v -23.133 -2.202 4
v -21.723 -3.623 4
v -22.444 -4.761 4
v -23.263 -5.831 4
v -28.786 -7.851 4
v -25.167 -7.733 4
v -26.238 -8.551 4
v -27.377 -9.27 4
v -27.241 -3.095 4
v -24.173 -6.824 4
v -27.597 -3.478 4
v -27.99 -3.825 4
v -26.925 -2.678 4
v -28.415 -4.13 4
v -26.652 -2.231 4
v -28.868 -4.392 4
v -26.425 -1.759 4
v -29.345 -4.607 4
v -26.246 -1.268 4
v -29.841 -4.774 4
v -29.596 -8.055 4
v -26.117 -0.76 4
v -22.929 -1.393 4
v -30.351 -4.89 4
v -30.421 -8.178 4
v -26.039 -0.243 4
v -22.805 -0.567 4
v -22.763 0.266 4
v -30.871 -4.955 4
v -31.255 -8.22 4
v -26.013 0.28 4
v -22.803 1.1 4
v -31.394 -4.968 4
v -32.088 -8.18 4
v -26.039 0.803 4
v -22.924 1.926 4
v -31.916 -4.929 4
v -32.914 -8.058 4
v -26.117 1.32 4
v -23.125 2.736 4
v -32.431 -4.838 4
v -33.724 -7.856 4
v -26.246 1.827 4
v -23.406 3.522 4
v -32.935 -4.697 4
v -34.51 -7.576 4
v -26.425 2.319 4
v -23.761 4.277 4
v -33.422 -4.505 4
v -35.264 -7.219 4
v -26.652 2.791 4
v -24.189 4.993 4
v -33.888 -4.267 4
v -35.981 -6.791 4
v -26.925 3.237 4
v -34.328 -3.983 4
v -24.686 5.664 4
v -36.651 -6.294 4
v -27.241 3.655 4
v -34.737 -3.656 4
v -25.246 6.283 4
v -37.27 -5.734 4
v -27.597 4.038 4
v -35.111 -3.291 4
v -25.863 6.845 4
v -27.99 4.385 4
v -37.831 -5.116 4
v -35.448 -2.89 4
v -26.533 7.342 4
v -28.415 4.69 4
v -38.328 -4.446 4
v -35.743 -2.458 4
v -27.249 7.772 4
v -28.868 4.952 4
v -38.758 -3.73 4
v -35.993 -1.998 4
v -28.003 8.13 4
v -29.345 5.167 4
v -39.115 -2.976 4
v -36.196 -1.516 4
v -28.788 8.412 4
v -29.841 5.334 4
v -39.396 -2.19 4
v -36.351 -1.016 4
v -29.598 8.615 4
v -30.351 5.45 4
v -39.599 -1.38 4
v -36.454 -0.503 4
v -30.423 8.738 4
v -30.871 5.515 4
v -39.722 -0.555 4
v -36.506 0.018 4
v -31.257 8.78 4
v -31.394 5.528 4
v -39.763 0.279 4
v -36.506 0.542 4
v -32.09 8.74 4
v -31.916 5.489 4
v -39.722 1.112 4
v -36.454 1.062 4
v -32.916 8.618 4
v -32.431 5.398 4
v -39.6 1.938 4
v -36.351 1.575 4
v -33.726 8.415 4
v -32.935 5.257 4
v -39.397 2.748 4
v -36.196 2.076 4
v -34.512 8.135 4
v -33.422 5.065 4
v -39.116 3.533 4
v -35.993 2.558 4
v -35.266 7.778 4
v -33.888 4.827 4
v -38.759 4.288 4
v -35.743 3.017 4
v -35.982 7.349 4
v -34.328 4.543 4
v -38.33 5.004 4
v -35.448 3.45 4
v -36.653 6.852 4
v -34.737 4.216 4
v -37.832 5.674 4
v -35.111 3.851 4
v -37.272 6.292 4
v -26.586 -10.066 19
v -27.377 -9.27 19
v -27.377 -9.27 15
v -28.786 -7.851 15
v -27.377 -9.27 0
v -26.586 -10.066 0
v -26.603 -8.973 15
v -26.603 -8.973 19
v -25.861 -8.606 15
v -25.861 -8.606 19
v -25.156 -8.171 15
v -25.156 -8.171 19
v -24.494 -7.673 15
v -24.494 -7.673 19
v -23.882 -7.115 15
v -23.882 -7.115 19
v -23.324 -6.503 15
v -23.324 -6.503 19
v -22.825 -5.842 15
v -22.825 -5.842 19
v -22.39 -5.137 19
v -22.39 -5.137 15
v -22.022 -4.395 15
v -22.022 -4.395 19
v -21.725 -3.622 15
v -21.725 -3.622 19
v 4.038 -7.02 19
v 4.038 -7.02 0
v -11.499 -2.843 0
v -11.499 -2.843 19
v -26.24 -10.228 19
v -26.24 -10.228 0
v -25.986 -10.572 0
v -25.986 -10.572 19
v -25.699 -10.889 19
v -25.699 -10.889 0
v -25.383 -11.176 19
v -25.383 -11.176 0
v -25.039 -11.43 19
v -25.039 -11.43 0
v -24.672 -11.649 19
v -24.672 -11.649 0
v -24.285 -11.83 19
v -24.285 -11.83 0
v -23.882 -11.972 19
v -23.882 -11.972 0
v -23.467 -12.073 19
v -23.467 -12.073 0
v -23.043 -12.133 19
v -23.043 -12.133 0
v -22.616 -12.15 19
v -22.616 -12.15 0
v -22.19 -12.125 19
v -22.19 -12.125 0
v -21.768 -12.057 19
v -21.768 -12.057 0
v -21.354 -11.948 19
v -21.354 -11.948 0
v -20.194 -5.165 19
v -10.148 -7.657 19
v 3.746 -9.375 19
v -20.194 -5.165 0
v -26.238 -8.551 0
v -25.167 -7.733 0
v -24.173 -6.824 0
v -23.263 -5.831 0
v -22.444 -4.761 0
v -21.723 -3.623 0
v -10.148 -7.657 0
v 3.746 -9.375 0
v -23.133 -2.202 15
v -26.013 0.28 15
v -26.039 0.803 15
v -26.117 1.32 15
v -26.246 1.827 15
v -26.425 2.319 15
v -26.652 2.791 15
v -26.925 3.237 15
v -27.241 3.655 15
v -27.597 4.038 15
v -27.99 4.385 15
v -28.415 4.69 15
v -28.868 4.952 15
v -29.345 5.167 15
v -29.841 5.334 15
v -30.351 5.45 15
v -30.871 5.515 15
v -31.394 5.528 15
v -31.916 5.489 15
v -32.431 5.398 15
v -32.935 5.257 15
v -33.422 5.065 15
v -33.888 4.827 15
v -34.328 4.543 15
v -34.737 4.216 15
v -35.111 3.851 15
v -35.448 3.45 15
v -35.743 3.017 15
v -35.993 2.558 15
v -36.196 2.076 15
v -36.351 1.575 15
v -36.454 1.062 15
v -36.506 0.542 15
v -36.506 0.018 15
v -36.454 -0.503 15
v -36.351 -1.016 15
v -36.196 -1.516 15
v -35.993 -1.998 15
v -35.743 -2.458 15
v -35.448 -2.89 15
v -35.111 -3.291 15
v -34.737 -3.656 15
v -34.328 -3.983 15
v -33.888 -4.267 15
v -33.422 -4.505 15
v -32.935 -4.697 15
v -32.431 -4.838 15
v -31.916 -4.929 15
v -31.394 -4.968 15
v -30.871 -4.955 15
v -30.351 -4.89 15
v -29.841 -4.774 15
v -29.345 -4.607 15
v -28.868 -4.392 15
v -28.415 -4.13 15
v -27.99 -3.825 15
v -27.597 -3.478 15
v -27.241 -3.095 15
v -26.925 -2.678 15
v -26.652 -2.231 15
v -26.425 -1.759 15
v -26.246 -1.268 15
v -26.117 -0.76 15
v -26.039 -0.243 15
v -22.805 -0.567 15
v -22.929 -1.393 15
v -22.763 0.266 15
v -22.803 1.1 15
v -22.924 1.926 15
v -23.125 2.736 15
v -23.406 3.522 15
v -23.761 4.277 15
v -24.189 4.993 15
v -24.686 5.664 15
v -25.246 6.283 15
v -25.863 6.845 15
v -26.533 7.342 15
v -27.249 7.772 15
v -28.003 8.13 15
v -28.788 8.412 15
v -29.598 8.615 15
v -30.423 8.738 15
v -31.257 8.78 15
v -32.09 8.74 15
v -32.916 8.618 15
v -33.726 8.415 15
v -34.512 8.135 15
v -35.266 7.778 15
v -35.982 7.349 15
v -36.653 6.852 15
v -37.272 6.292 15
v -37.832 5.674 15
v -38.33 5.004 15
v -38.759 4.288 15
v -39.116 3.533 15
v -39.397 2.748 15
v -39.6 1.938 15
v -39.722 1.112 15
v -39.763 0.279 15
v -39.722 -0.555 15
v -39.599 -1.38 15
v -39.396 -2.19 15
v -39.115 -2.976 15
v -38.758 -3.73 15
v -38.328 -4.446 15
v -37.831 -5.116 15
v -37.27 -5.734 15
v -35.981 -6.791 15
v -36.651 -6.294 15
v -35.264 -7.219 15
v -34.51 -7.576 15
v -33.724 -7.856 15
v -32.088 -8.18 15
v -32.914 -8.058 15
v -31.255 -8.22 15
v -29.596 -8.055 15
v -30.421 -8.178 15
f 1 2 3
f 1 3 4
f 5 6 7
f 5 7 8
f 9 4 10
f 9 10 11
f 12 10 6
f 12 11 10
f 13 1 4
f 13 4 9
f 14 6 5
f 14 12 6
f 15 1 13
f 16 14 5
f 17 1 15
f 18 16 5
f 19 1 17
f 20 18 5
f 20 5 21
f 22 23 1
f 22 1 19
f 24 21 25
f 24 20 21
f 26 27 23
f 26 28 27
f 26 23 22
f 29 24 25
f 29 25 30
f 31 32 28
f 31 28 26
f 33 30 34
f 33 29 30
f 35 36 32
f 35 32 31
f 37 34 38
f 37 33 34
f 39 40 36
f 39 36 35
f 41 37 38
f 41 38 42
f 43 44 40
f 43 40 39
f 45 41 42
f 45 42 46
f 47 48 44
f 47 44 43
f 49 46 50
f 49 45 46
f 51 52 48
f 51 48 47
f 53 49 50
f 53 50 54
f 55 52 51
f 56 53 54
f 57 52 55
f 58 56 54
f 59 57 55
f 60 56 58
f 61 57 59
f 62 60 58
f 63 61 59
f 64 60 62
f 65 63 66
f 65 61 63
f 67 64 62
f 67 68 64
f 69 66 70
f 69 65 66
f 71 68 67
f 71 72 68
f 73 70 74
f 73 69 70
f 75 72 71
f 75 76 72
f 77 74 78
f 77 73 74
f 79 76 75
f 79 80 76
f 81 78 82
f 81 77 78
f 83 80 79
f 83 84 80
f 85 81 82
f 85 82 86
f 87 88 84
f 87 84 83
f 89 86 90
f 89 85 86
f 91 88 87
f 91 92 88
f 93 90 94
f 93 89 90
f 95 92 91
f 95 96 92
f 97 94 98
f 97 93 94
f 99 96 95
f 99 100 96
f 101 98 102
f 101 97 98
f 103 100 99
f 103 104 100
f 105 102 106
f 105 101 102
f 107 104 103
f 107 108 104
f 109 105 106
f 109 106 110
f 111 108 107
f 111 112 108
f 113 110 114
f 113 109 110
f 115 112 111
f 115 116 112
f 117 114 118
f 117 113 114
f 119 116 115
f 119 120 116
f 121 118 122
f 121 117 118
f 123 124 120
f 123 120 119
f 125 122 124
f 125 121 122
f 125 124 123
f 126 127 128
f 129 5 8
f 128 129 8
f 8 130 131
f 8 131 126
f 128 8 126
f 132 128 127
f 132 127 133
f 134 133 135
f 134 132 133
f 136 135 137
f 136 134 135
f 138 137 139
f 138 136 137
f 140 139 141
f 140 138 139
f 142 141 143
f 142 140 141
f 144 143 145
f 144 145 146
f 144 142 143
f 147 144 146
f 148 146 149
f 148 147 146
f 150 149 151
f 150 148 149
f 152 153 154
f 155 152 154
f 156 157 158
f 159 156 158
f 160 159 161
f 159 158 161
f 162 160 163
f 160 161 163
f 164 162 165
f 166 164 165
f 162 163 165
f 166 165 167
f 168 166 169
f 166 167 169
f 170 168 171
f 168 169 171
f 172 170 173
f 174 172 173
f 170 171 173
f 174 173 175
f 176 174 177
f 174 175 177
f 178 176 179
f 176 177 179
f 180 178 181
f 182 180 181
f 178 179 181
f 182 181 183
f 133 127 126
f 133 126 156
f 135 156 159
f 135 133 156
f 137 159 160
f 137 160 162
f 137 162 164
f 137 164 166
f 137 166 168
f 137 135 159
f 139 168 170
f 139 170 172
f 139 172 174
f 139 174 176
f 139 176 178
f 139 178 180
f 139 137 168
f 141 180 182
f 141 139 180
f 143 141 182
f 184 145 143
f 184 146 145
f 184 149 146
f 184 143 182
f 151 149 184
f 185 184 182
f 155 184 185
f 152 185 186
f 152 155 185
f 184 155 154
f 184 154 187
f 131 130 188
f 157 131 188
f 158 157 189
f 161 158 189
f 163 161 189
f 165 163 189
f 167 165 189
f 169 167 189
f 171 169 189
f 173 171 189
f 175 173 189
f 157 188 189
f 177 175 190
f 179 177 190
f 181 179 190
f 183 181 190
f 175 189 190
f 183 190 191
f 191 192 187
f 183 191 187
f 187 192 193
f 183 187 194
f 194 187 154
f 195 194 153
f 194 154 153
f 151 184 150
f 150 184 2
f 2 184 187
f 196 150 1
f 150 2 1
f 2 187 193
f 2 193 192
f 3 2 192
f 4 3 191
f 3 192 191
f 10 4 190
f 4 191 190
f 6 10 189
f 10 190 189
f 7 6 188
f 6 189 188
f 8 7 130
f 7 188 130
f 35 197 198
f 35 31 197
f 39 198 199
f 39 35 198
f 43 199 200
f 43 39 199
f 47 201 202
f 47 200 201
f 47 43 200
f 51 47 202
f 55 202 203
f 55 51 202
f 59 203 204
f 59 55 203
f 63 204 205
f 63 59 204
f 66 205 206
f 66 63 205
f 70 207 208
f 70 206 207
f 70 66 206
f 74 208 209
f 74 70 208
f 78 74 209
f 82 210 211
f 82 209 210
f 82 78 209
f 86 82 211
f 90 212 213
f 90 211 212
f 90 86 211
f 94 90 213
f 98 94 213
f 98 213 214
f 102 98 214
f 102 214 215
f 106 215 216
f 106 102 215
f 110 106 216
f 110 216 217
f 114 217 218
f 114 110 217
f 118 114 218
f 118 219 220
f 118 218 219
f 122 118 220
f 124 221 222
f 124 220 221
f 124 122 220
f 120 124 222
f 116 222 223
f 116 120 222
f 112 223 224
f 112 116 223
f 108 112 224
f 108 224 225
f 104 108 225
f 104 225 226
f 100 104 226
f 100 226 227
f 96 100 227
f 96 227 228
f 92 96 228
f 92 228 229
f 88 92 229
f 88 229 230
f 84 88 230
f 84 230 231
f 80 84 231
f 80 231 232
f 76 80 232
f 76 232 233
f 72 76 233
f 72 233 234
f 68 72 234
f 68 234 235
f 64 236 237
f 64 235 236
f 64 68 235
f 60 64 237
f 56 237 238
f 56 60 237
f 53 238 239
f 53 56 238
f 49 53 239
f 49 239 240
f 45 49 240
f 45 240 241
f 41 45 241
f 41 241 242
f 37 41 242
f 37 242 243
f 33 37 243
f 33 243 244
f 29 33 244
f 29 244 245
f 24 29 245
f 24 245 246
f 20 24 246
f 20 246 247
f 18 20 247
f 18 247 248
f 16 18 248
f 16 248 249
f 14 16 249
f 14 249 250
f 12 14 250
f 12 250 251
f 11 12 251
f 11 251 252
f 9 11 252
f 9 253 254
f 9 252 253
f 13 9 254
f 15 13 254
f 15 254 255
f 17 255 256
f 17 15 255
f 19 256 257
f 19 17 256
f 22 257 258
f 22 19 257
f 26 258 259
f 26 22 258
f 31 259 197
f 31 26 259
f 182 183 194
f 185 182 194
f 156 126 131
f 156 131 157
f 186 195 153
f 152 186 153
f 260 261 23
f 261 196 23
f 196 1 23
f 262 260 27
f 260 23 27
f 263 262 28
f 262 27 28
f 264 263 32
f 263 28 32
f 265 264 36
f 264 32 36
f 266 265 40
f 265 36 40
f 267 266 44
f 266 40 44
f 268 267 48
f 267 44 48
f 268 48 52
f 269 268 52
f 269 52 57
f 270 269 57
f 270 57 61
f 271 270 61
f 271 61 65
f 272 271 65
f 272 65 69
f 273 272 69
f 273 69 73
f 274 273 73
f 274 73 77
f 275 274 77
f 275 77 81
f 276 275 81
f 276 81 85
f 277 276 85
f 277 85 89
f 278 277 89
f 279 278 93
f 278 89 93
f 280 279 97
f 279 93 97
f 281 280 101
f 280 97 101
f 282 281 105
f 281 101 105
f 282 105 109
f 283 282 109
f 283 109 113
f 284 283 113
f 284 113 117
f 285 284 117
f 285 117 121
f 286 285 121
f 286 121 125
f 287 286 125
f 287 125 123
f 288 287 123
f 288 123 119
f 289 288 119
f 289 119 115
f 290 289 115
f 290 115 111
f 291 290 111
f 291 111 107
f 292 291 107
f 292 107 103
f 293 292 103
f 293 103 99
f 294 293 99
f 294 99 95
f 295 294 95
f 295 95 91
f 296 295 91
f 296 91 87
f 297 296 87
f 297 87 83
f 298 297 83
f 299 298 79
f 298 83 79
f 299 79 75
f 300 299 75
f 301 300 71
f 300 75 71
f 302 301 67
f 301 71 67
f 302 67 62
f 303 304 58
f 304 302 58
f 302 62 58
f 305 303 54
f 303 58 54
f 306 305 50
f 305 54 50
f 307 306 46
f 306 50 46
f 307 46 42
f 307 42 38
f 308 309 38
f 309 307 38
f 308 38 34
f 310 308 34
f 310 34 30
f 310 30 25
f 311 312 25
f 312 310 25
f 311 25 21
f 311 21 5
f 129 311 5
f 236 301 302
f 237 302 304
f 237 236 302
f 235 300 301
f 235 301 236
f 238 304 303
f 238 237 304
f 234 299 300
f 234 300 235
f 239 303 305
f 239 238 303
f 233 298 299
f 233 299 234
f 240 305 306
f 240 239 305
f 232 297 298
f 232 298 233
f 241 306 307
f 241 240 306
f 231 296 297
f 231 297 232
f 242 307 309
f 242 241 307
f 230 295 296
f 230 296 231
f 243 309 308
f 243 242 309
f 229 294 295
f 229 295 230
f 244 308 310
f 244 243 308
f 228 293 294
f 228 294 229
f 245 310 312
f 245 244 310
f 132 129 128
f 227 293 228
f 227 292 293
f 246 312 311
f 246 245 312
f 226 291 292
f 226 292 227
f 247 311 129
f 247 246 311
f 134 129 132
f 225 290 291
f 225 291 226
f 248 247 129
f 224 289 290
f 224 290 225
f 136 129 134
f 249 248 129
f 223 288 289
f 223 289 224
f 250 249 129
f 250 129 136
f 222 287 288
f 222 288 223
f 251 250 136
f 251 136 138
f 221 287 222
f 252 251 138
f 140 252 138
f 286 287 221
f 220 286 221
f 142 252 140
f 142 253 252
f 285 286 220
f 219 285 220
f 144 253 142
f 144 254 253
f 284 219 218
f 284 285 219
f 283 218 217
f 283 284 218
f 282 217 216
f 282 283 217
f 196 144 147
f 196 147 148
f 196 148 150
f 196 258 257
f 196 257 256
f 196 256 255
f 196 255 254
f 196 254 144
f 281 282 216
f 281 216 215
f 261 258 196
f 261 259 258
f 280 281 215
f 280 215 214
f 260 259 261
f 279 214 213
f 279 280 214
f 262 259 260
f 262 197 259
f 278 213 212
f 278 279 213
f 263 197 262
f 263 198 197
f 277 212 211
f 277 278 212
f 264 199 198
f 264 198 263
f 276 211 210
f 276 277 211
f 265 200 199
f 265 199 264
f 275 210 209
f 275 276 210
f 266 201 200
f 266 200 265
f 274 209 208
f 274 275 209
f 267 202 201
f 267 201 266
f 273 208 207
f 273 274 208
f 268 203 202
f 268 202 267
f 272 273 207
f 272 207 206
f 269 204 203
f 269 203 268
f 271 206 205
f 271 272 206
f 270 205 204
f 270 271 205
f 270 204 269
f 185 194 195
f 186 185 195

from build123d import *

# Parameters (mm, degrees)
BOSS_EXTRUDE1_OUTLINE_R = 5.250010824
BOSS_EXTRUDE1_DEPTH     = 19
CUT_EXTRUDE1_START      = -4
SKETCH2_R               = 8.500003527
CUT_EXTRUDE1_DEPTH      = 4
SKETCH3_R               = 8.500003527
CUT_EXTRUDE2_DEPTH      = 4
CUT_EXTRUDE3_START      = -4
CUT_EXTRUDE3_DEPTH      = 4
CUT_EXTRUDE4_DEPTH      = 4


# Read off the part's stored shape, not the designer's step: Boss-Extrude1
with BuildPart() as part:
    # Boss-Extrude1 outline → Boss-Extrude1 (new body)
    with BuildSketch(Plane.XY):
        with BuildLine():
            ThreePointArc((-23.133312794, -2.201771211), (-37.271533994, 6.292181292), (-28.786231545, -7.851233083))
            Line((-28.786231545, -7.851233083), (-26.586143602, -10.066323126))
            Line((-26.586143602, -10.066323126), (-26.23976909, -10.228203619))
            ThreePointArc((-26.23976909, -10.228203619), (-24.085157131, -11.906333766), (-21.354454149, -11.947983588))
            Line((-21.354454149, -11.947983588), (-10.14791118, -7.656975592))
            Line((-10.14791118, -7.656975592), (3.746314894, -9.374802435))
            Line((3.746314894, -9.374802435), (4.037513624, -7.019745673))
            Line((4.037513624, -7.019745673), (-11.498619188, -2.842881049))
            Line((-11.498619188, -2.842881049), (-20.193931688, -5.164955939))
            Line((-20.193931688, -5.164955939), (-23.133312794, -2.201771211))
        make_face()
        with Locations((-31.26296245, 0.27993313)):
            Circle(BOSS_EXTRUDE1_OUTLINE_R, mode=Mode.SUBTRACT)
    extrude(amount=BOSS_EXTRUDE1_DEPTH)

    # Sketch2 → Cut-Extrude1 (cut)
    with BuildSketch(Plane.XY.offset(19).offset(CUT_EXTRUDE1_START)):
        with Locations((-31.26296245, 0.27993313)):
            Circle(SKETCH2_R)
    extrude(amount=CUT_EXTRUDE1_DEPTH, mode=Mode.SUBTRACT)

    # Sketch3 → Cut-Extrude2 (cut)
    with BuildSketch(Plane(origin=(0, 0, 0), x_dir=(-1, 0, 0), z_dir=(0, 0, -1))):
        with Locations((31.26296245, 0.27993313)):
            Circle(SKETCH3_R)
    extrude(amount=-CUT_EXTRUDE2_DEPTH, mode=Mode.SUBTRACT)

    # Sketch4 → Cut-Extrude3 (cut)
    with BuildSketch(Plane.XY.offset(19).offset(CUT_EXTRUDE3_START)):
        with BuildLine():
            Line((-28.786231545, -7.851233083), (-27.3768314, -9.270243736))
            ThreePointArc((-27.3768314, -9.270243736), (-23.881833101, -7.115358231), (-21.724813867, -3.621676409))
            Line((-21.724813867, -3.621676409), (-23.133312794, -2.201771211))
            ThreePointArc((-23.133312794, -2.201771211), (-25.254390905, -5.732315031), (-28.786231545, -7.851233083))
        make_face()
    extrude(amount=CUT_EXTRUDE3_DEPTH, mode=Mode.SUBTRACT)

    # Sketch5 → Cut-Extrude4 (cut)
    with BuildSketch(Plane(origin=(0, 0, 0), x_dir=(-1, 0, 0), z_dir=(0, 0, -1))):
        with BuildLine():
            Line((23.133312794, -2.201771211), (21.719099232, -3.615984773))
            ThreePointArc((21.719099232, -3.615984773), (24.169813566, -6.821498289), (27.3768314, -9.270243736))
            Line((27.3768314, -9.270243736), (28.786231545, -7.851233083))
            ThreePointArc((28.786231545, -7.851233083), (25.254390905, -5.732315031), (23.133312794, -2.201771211))
        make_face()
    extrude(amount=-CUT_EXTRUDE4_DEPTH, mode=Mode.SUBTRACT)


solid = part.part
